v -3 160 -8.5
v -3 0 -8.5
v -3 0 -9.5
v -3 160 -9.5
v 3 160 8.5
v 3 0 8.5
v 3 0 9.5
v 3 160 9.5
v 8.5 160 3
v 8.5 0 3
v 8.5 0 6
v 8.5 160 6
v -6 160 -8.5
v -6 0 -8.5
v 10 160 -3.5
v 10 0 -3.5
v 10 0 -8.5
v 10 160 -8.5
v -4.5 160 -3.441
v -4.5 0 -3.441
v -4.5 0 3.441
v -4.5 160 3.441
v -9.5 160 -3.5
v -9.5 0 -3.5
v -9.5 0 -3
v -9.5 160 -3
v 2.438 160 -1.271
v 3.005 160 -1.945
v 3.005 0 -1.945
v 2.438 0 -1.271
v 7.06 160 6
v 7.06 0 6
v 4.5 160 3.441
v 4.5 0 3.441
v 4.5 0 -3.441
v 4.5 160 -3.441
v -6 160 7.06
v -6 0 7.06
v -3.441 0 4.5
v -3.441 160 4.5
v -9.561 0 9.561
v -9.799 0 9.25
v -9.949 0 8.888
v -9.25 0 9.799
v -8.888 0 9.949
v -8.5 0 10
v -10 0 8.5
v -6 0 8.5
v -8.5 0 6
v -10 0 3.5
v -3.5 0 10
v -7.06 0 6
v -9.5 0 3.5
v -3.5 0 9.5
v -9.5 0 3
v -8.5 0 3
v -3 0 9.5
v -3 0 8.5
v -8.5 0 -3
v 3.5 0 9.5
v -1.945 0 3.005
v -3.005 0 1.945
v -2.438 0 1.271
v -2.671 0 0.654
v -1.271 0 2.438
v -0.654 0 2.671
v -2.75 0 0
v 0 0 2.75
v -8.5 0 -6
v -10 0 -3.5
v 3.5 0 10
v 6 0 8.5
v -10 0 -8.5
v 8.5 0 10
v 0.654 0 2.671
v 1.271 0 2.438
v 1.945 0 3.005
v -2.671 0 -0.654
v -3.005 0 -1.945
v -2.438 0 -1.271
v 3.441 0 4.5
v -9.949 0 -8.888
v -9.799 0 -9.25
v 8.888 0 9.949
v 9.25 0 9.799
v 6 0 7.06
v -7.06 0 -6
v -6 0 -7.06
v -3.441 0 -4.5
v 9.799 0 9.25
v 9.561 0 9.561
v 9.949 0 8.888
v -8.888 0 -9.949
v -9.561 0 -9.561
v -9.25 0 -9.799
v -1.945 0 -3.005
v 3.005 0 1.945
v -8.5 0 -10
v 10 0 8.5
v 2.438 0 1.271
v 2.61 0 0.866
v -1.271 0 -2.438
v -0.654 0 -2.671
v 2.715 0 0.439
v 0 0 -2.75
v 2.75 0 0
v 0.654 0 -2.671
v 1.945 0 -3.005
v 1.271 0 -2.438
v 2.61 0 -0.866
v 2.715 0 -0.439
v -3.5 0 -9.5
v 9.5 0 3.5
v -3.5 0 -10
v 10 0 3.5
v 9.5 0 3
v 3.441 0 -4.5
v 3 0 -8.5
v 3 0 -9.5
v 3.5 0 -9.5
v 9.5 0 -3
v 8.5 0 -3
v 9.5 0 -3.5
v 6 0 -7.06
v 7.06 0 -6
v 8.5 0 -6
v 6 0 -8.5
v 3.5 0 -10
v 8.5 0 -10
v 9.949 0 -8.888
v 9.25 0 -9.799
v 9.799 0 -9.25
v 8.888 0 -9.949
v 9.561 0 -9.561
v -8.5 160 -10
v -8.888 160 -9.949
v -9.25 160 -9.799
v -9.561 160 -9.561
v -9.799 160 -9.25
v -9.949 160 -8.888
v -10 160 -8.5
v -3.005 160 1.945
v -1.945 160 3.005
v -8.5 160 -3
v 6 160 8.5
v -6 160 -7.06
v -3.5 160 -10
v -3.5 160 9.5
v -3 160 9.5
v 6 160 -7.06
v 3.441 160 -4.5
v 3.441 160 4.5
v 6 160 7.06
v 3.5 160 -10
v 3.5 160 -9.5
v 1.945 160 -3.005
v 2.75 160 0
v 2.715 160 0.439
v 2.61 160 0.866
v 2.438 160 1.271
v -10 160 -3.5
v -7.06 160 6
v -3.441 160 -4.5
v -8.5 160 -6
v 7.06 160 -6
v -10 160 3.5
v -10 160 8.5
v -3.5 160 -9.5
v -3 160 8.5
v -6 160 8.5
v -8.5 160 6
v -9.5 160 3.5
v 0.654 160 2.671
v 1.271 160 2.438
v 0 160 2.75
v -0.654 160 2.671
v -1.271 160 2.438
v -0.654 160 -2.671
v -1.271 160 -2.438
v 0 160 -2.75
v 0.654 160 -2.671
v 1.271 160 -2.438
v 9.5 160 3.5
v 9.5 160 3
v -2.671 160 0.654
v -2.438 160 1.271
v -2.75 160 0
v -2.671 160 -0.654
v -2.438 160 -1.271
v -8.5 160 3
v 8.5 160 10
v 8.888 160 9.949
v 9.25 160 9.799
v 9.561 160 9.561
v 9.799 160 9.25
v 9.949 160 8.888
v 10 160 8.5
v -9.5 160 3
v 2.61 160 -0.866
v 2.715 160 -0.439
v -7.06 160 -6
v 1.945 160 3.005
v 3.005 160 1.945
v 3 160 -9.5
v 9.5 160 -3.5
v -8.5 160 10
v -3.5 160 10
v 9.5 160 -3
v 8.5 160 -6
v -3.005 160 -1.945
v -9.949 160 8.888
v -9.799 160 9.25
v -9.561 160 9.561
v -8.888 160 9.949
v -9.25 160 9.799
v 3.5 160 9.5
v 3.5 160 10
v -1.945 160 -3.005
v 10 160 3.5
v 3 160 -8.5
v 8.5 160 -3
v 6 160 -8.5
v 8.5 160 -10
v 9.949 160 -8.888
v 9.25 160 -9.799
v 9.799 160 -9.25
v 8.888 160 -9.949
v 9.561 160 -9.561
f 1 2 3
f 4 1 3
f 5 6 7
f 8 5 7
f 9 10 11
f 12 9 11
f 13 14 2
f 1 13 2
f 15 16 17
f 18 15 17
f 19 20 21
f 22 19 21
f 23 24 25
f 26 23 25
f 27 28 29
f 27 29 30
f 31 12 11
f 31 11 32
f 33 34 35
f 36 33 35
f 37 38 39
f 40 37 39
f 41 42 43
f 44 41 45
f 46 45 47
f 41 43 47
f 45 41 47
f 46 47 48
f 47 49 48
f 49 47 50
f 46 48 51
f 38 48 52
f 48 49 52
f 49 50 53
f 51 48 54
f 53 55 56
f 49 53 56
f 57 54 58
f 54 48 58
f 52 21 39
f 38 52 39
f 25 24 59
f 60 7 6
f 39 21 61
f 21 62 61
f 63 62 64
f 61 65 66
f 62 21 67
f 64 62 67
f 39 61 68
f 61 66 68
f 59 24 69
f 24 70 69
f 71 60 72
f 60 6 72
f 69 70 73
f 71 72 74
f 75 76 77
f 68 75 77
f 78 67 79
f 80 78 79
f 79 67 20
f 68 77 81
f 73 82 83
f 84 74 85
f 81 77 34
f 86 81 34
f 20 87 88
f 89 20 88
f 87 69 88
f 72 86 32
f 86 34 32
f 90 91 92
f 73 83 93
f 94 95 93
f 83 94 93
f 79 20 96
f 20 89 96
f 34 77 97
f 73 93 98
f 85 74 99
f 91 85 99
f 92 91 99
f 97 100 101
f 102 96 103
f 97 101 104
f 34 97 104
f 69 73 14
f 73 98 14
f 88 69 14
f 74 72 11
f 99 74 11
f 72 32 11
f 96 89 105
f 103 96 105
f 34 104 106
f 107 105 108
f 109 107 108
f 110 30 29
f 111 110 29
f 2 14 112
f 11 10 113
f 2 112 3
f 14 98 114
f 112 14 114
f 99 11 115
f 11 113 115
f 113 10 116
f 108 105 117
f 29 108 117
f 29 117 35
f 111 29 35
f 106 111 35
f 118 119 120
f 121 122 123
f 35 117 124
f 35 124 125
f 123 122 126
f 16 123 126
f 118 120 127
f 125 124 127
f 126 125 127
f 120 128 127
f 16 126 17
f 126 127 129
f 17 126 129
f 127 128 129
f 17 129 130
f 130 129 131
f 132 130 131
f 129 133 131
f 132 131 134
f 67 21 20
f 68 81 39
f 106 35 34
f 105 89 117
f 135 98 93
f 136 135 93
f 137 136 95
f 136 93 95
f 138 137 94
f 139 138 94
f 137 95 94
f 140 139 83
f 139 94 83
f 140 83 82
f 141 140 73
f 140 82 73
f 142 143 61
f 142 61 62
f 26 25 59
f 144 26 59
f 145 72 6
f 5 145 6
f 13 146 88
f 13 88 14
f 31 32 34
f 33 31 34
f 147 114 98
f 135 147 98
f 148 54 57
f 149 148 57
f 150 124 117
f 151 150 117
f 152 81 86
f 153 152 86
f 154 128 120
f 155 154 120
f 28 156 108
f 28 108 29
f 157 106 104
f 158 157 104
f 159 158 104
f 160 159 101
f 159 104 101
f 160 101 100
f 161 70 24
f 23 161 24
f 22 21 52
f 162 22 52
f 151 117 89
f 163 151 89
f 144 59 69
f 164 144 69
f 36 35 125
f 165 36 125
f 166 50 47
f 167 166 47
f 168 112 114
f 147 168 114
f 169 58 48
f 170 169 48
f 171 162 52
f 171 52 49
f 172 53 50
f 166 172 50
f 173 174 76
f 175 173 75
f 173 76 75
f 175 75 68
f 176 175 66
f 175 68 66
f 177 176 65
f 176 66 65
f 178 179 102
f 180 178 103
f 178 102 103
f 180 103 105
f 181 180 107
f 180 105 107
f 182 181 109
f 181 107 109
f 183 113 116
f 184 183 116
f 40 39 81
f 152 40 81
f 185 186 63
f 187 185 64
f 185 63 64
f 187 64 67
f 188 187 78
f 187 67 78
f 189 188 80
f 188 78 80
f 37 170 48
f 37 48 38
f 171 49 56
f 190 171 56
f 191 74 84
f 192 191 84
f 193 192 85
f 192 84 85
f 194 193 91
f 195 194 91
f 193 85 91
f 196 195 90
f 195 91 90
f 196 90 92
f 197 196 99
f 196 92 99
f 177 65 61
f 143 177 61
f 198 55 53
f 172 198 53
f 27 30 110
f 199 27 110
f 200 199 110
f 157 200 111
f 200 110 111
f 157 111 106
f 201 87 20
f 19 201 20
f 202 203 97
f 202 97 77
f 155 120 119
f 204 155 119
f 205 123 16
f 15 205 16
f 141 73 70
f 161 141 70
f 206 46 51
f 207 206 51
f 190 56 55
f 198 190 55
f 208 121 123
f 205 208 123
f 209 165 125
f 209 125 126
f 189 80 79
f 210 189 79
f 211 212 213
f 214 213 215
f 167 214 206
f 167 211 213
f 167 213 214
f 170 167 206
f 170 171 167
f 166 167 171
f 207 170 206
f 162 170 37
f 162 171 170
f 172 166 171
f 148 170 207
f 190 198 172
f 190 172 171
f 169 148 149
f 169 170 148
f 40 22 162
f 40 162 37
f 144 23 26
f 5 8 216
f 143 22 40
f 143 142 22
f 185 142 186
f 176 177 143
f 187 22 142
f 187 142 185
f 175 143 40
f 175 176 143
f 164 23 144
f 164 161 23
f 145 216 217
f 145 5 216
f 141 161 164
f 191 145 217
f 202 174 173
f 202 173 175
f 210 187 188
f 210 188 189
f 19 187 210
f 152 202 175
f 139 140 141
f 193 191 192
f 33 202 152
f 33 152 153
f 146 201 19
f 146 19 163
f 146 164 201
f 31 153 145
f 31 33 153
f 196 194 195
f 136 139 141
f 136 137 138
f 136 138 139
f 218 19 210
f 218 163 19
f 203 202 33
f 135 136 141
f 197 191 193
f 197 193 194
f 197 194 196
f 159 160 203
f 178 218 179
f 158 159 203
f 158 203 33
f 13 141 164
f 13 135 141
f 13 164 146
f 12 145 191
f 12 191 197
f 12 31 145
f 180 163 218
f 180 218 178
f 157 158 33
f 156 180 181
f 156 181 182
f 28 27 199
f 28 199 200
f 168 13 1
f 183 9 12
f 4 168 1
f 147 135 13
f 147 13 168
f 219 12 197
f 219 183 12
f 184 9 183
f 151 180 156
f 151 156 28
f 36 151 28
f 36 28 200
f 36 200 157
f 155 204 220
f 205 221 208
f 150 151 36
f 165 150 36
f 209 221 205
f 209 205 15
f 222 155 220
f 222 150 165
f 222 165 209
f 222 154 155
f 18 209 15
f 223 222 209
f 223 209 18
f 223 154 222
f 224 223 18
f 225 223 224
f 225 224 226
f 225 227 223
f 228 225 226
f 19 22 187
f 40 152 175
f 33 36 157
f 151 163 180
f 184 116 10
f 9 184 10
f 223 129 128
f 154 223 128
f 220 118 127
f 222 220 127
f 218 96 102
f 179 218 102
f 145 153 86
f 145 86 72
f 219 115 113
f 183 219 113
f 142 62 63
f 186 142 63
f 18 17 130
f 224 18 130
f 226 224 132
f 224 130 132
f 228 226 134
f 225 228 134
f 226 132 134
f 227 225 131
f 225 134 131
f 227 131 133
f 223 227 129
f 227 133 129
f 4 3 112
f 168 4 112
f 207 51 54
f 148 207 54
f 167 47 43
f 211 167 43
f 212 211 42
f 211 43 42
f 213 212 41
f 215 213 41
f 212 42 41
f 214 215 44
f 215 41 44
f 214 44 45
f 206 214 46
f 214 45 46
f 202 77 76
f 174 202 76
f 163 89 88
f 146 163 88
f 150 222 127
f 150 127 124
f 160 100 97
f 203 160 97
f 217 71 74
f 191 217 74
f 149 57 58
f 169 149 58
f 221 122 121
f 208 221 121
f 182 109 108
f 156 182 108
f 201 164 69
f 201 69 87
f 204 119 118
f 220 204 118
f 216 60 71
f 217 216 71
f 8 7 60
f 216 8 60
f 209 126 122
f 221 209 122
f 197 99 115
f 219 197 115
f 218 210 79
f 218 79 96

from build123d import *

# Parameters (mm, degrees)
DODANIE_WYCI_GNI_CIE1_DEPTH = 160


with BuildPart() as part:
    # Szkic1 → Dodanie-wyciągnięcie1 (new body)
    with BuildSketch(Plane(origin=(0, 0, 0), x_dir=(1, 0, 0), z_dir=(0, 1, 0))):
        with BuildLine():
            Line((-7.06, 6), (-4.5, 3.440546933))
            Line((-4.5, 3.440546933), (-4.5, 4.5))
            Line((-4.5, 4.5), (-3.440546933, 4.5))
            Line((-3.440546933, 4.5), (-6, 7.06))
            Line((-6, 7.06), (-6, 8.5))
            Line((-6, 8.5), (-3, 8.5))
            Line((-3, 8.5), (-3, 9.5))
            Line((-3, 9.5), (-3.5, 9.5))
            Line((-3.5, 9.5), (-3.5, 10))
            Line((-3.5, 10), (-8.5, 10))
            ThreePointArc((-8.5, 10), (-9.560660172, 9.560660172), (-10, 8.5))
            Line((-10, 8.5), (-10, 3.5))
            Line((-10, 3.5), (-9.5, 3.5))
            Line((-9.5, 3.5), (-9.5, 3))
            Line((-9.5, 3), (-8.5, 3))
            Line((-8.5, 3), (-8.5, 6))
            Line((-8.5, 6), (-7.06, 6))
        make_face()
        with BuildLine():
            Line((4.5, 4.5), (4.5, 3.440546933))
            Line((4.5, 3.440546933), (7.06, 6))
            Line((7.06, 6), (8.5, 6))
            Line((8.5, 6), (8.5, 3))
            Line((8.5, 3), (9.5, 3))
            Line((9.5, 3), (9.5, 3.5))
            Line((9.5, 3.5), (10, 3.5))
            Line((10, 3.5), (10, 8.5))
            ThreePointArc((10, 8.5), (9.560660172, 9.560660172), (8.5, 10))
            Line((8.5, 10), (3.5, 10))
            Line((3.5, 10), (3.5, 9.5))
            Line((3.5, 9.5), (3, 9.5))
            Line((3, 9.5), (3, 8.5))
            Line((3, 8.5), (6, 8.5))
            Line((6, 8.5), (6, 7.06))
            Line((6, 7.06), (3.440546933, 4.5))
            Line((3.440546933, 4.5), (4.5, 4.5))
        make_face()
        Polygon((3.440546933, -4.5), (4.5, -4.5), (4.5, -3.440546933), (4.5, 3.440546933), (4.5, 4.5), (3.440546933, 4.5), (-3.440546933, 4.5), (-4.5, 4.5), (-4.5, 3.440546933), (-4.5, -3.440546933), (-4.5, -4.5), (-3.440546933, -4.5), align=None)
        with BuildLine():
            Line((-3.00520382, 1.944543648), (-1.944543648, 3.00520382))
            Line((-1.944543648, 3.00520382), (-1.271309214, 2.438498079))
            ThreePointArc((-1.271309214, 2.438498079), (0, 2.75), (1.271309214, 2.438498079))
            Line((1.271309214, 2.438498079), (1.944543648, 3.00520382))
            Line((1.944543648, 3.00520382), (3.00520382, 1.944543648))
            Line((3.00520382, 1.944543648), (2.438498079, 1.271309214))
            ThreePointArc((2.438498079, 1.271309214), (2.670989491, 0.654457899), (2.75, 0))
            ThreePointArc((2.75, 0), (2.670989491, -0.654457899), (2.438498079, -1.271309214))
            Line((2.438498079, -1.271309214), (3.00520382, -1.944543648))
            Line((3.00520382, -1.944543648), (1.944543648, -3.00520382))
            Line((1.944543648, -3.00520382), (1.271309214, -2.438498079))
            ThreePointArc((1.271309214, -2.438498079), (0, -2.75), (-1.271309214, -2.438498079))
            Line((-1.271309214, -2.438498079), (-1.944543648, -3.00520382))
            Line((-1.944543648, -3.00520382), (-3.00520382, -1.944543648))
            Line((-3.00520382, -1.944543648), (-2.438498079, -1.271309214))
            ThreePointArc((-2.438498079, -1.271309214), (-2.75, 0), (-2.438498079, 1.271309214))
            Line((-2.438498079, 1.271309214), (-3.00520382, 1.944543648))
        make_face(mode=Mode.SUBTRACT)
        with BuildLine():
            Line((-6, -7.06), (-3.440546933, -4.5))
            Line((-3.440546933, -4.5), (-4.5, -4.5))
            Line((-4.5, -4.5), (-4.5, -3.440546933))
            Line((-4.5, -3.440546933), (-7.06, -6))
            Line((-7.06, -6), (-8.5, -6))
            Line((-8.5, -6), (-8.5, -3))
            Line((-8.5, -3), (-9.5, -3))
            Line((-9.5, -3), (-9.5, -3.5))
            Line((-9.5, -3.5), (-10, -3.5))
            Line((-10, -3.5), (-10, -8.5))
            ThreePointArc((-10, -8.5), (-9.560660172, -9.560660172), (-8.5, -10))
            Line((-8.5, -10), (-3.5, -10))
            Line((-3.5, -10), (-3.5, -9.5))
            Line((-3.5, -9.5), (-3, -9.5))
            Line((-3, -9.5), (-3, -8.5))
            Line((-3, -8.5), (-6, -8.5))
            Line((-6, -8.5), (-6, -7.06))
        make_face()
        with BuildLine():
            Line((4.5, -3.440546933), (4.5, -4.5))
            Line((4.5, -4.5), (3.440546933, -4.5))
            Line((3.440546933, -4.5), (6, -7.06))
            Line((6, -7.06), (6, -8.5))
            Line((6, -8.5), (3, -8.5))
            Line((3, -8.5), (3, -9.5))
            Line((3, -9.5), (3.5, -9.5))
            Line((3.5, -9.5), (3.5, -10))
            Line((3.5, -10), (8.5, -10))
            ThreePointArc((8.5, -10), (9.560660172, -9.560660172), (10, -8.5))
            Line((10, -8.5), (10, -3.5))
            Line((10, -3.5), (9.5, -3.5))
            Line((9.5, -3.5), (9.5, -3))
            Line((9.5, -3), (8.5, -3))
            Line((8.5, -3), (8.5, -6))
            Line((8.5, -6), (7.06, -6))
            Line((7.06, -6), (4.5, -3.440546933))
        make_face()
    extrude(amount=DODANIE_WYCI_GNI_CIE1_DEPTH)


solid = part.part
